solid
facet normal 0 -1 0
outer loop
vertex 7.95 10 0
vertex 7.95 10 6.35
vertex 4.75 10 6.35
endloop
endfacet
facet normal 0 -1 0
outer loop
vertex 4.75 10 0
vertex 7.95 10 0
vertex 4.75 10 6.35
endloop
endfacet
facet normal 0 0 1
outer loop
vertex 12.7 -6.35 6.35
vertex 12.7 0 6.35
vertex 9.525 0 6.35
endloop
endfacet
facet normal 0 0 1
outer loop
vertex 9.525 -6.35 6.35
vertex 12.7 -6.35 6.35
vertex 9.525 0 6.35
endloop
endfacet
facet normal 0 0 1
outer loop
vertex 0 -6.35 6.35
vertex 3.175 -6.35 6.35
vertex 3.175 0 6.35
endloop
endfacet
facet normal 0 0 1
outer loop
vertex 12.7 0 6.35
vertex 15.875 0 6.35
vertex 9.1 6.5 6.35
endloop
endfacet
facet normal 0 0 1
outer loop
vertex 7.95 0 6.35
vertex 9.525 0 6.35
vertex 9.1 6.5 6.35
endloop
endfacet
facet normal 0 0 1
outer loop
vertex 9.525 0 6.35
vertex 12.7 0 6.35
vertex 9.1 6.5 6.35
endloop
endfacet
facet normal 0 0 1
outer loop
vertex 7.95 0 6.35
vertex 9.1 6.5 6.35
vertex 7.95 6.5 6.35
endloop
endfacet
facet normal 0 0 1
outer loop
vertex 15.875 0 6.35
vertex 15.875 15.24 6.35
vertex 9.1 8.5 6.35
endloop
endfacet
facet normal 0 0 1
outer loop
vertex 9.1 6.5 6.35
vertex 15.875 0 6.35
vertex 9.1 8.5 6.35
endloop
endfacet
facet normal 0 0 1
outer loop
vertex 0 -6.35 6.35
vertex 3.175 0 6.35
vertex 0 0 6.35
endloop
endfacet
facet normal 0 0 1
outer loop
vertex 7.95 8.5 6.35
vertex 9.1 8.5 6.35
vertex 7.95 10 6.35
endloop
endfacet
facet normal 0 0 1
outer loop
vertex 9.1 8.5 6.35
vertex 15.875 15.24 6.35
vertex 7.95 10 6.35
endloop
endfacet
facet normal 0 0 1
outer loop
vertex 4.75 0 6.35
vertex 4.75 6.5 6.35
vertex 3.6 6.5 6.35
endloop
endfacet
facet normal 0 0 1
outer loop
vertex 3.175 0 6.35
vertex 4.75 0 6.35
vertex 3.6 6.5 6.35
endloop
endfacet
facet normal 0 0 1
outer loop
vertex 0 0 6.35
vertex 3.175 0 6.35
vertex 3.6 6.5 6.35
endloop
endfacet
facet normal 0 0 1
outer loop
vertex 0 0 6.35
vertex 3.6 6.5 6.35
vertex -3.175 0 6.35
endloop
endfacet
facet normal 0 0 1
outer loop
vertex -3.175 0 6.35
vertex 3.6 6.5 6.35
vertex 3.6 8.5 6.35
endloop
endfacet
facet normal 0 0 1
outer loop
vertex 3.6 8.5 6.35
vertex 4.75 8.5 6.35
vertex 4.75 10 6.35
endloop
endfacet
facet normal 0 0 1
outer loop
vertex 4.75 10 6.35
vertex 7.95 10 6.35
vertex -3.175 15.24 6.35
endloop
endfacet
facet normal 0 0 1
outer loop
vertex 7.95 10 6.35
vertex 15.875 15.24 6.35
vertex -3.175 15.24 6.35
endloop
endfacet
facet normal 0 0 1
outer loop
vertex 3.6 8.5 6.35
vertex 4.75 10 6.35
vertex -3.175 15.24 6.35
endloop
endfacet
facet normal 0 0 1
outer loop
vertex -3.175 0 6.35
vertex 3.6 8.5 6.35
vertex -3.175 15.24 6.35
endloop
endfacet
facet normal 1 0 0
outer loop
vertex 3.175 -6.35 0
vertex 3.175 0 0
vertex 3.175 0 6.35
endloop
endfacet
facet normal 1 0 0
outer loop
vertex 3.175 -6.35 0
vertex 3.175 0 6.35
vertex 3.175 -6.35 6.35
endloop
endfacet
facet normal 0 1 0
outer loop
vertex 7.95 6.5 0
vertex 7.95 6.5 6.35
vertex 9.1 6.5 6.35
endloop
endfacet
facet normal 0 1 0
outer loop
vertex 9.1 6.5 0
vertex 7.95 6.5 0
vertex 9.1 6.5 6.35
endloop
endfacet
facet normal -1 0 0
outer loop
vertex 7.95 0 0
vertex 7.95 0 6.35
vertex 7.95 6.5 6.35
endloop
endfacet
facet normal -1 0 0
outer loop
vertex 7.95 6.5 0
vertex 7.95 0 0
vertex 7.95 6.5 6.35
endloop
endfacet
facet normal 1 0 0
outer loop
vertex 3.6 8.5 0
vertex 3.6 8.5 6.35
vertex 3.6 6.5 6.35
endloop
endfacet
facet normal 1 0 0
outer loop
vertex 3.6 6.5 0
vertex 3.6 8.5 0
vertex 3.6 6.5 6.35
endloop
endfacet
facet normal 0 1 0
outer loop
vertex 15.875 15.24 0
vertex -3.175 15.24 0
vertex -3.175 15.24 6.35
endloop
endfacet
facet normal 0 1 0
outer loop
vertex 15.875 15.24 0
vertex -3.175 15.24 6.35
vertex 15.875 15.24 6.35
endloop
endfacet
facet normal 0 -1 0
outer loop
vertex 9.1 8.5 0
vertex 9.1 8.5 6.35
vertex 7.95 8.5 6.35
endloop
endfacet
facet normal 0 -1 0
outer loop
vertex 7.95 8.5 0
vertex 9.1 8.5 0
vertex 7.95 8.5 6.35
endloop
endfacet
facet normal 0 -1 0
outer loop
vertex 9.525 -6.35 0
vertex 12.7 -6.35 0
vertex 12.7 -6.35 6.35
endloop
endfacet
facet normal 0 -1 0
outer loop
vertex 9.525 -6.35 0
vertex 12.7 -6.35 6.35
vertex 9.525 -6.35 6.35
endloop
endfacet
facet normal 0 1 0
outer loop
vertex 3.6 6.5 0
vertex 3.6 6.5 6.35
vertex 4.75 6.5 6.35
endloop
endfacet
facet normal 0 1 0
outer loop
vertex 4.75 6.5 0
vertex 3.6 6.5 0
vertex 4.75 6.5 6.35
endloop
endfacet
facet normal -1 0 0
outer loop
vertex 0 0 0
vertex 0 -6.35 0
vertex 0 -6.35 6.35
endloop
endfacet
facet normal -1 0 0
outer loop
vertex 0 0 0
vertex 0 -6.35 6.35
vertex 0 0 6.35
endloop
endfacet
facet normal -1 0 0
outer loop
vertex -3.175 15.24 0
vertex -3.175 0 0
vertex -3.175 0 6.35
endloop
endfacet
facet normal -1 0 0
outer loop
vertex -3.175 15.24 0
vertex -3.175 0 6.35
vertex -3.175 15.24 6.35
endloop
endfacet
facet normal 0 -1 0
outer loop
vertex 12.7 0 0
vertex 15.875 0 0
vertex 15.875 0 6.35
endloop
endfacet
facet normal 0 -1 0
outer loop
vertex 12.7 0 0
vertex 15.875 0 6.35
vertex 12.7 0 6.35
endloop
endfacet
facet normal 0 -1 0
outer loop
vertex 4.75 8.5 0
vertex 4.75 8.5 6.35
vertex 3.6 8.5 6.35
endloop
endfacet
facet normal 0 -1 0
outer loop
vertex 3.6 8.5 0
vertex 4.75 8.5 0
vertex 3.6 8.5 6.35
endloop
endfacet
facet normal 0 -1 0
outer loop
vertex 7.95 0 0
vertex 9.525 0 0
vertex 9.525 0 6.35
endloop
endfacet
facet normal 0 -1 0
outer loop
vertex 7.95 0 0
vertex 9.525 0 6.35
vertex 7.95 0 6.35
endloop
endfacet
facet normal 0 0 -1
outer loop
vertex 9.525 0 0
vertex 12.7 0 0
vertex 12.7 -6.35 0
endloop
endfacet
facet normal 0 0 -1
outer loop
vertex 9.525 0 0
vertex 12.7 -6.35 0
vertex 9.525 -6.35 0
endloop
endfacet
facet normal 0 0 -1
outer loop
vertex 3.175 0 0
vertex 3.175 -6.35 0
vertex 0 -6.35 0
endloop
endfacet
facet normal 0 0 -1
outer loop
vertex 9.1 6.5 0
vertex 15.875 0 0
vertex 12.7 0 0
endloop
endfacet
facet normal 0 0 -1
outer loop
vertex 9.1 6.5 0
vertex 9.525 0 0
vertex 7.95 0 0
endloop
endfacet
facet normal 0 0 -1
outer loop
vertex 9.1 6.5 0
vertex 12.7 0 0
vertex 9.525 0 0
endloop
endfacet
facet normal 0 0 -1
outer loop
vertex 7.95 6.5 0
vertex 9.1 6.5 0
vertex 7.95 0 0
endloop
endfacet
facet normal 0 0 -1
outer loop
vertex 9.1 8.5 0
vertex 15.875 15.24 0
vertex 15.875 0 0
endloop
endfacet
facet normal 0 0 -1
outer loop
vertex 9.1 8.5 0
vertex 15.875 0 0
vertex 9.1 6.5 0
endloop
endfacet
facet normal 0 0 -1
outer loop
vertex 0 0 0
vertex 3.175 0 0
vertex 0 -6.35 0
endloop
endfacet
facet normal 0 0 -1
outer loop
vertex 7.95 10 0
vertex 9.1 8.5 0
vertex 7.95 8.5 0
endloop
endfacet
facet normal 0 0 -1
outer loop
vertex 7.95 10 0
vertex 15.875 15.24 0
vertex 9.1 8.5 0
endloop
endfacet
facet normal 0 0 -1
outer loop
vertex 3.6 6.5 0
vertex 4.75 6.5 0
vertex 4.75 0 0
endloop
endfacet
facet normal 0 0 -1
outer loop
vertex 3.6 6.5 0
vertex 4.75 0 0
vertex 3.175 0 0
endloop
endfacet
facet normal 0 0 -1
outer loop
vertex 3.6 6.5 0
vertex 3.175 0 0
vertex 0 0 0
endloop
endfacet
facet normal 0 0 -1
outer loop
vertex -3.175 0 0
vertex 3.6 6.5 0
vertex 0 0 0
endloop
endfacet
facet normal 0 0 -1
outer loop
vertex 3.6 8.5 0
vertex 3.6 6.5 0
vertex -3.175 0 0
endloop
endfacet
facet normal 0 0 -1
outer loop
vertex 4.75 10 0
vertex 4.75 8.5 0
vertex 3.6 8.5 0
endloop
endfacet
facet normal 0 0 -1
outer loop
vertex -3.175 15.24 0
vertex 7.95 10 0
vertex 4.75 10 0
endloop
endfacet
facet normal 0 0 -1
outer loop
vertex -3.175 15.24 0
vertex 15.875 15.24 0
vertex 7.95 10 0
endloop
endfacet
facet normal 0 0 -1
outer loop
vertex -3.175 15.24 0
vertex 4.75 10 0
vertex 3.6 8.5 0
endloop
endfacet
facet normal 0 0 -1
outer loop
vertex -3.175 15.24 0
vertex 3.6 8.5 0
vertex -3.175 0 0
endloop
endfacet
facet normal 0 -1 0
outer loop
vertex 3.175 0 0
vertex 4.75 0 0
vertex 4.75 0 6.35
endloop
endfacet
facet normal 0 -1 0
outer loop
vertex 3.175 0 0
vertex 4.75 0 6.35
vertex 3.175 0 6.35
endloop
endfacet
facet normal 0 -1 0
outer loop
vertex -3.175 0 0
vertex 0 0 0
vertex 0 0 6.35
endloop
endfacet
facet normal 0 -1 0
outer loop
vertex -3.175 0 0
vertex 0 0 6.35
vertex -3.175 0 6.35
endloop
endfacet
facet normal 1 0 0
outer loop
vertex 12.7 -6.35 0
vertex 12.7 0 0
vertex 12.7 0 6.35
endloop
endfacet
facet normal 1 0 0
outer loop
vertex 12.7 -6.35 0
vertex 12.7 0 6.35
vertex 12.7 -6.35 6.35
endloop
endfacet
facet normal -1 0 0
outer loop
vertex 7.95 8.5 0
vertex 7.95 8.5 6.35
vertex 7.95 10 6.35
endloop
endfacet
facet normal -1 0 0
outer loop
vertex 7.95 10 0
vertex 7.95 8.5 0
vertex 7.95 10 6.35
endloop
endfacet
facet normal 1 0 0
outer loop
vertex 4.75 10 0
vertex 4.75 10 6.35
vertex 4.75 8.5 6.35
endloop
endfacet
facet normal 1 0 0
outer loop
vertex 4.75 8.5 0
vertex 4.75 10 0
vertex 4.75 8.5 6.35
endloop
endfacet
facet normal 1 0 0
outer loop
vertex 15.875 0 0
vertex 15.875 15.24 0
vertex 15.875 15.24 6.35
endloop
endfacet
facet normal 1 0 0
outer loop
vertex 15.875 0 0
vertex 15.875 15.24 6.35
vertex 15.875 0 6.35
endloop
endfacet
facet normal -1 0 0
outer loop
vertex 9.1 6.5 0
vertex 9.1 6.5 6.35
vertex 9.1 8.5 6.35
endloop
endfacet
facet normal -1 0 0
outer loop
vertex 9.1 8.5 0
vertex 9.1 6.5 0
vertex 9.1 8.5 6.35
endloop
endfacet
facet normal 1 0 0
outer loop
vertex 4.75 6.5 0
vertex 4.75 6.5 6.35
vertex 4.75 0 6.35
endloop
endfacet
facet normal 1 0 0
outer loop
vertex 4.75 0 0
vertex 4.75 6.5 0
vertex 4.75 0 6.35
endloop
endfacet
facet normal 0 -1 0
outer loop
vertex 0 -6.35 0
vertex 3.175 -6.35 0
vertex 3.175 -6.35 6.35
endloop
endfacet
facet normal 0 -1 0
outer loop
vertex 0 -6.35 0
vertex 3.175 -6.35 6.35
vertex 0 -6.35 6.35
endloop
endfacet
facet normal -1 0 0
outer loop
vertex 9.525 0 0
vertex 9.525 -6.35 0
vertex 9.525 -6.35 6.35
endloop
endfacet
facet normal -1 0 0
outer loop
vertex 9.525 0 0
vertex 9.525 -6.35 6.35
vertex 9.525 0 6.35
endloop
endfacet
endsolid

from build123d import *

# Parameters (mm, degrees)
BOSS_EXTRUDE1_DEPTH = 6.35
CUT_EXTRUDE3_DEPTH  = 7.35


with BuildPart() as part:
    # Sketch1 → Boss-Extrude1 (new body)
    with BuildSketch(Plane.XY):
        Polygon((-3.175, 15.24), (15.875, 15.24), (15.875, 0), (12.7, 0), (12.7, -6.35), (9.525, -6.35), (9.525, 0), (3.175, 0), (3.175, -6.35), (0, -6.35), (0, 0), (-3.175, 0), align=None)
    extrude(amount=BOSS_EXTRUDE1_DEPTH)

    # Sketch3 → Cut-Extrude3 (cut, through all)
    with BuildSketch(Plane.XY.offset(6.35)):
        Polygon((4.75, 0), (7.95, 0), (7.95, 6.5), (9.1, 6.5), (9.1, 8.5), (7.95, 8.5), (7.95, 10), (4.75, 10), (4.75, 8.5), (3.6, 8.5), (3.6, 6.5), (4.75, 6.5), align=None)
    extrude(amount=-CUT_EXTRUDE3_DEPTH, mode=Mode.SUBTRACT)


solid = part.part
